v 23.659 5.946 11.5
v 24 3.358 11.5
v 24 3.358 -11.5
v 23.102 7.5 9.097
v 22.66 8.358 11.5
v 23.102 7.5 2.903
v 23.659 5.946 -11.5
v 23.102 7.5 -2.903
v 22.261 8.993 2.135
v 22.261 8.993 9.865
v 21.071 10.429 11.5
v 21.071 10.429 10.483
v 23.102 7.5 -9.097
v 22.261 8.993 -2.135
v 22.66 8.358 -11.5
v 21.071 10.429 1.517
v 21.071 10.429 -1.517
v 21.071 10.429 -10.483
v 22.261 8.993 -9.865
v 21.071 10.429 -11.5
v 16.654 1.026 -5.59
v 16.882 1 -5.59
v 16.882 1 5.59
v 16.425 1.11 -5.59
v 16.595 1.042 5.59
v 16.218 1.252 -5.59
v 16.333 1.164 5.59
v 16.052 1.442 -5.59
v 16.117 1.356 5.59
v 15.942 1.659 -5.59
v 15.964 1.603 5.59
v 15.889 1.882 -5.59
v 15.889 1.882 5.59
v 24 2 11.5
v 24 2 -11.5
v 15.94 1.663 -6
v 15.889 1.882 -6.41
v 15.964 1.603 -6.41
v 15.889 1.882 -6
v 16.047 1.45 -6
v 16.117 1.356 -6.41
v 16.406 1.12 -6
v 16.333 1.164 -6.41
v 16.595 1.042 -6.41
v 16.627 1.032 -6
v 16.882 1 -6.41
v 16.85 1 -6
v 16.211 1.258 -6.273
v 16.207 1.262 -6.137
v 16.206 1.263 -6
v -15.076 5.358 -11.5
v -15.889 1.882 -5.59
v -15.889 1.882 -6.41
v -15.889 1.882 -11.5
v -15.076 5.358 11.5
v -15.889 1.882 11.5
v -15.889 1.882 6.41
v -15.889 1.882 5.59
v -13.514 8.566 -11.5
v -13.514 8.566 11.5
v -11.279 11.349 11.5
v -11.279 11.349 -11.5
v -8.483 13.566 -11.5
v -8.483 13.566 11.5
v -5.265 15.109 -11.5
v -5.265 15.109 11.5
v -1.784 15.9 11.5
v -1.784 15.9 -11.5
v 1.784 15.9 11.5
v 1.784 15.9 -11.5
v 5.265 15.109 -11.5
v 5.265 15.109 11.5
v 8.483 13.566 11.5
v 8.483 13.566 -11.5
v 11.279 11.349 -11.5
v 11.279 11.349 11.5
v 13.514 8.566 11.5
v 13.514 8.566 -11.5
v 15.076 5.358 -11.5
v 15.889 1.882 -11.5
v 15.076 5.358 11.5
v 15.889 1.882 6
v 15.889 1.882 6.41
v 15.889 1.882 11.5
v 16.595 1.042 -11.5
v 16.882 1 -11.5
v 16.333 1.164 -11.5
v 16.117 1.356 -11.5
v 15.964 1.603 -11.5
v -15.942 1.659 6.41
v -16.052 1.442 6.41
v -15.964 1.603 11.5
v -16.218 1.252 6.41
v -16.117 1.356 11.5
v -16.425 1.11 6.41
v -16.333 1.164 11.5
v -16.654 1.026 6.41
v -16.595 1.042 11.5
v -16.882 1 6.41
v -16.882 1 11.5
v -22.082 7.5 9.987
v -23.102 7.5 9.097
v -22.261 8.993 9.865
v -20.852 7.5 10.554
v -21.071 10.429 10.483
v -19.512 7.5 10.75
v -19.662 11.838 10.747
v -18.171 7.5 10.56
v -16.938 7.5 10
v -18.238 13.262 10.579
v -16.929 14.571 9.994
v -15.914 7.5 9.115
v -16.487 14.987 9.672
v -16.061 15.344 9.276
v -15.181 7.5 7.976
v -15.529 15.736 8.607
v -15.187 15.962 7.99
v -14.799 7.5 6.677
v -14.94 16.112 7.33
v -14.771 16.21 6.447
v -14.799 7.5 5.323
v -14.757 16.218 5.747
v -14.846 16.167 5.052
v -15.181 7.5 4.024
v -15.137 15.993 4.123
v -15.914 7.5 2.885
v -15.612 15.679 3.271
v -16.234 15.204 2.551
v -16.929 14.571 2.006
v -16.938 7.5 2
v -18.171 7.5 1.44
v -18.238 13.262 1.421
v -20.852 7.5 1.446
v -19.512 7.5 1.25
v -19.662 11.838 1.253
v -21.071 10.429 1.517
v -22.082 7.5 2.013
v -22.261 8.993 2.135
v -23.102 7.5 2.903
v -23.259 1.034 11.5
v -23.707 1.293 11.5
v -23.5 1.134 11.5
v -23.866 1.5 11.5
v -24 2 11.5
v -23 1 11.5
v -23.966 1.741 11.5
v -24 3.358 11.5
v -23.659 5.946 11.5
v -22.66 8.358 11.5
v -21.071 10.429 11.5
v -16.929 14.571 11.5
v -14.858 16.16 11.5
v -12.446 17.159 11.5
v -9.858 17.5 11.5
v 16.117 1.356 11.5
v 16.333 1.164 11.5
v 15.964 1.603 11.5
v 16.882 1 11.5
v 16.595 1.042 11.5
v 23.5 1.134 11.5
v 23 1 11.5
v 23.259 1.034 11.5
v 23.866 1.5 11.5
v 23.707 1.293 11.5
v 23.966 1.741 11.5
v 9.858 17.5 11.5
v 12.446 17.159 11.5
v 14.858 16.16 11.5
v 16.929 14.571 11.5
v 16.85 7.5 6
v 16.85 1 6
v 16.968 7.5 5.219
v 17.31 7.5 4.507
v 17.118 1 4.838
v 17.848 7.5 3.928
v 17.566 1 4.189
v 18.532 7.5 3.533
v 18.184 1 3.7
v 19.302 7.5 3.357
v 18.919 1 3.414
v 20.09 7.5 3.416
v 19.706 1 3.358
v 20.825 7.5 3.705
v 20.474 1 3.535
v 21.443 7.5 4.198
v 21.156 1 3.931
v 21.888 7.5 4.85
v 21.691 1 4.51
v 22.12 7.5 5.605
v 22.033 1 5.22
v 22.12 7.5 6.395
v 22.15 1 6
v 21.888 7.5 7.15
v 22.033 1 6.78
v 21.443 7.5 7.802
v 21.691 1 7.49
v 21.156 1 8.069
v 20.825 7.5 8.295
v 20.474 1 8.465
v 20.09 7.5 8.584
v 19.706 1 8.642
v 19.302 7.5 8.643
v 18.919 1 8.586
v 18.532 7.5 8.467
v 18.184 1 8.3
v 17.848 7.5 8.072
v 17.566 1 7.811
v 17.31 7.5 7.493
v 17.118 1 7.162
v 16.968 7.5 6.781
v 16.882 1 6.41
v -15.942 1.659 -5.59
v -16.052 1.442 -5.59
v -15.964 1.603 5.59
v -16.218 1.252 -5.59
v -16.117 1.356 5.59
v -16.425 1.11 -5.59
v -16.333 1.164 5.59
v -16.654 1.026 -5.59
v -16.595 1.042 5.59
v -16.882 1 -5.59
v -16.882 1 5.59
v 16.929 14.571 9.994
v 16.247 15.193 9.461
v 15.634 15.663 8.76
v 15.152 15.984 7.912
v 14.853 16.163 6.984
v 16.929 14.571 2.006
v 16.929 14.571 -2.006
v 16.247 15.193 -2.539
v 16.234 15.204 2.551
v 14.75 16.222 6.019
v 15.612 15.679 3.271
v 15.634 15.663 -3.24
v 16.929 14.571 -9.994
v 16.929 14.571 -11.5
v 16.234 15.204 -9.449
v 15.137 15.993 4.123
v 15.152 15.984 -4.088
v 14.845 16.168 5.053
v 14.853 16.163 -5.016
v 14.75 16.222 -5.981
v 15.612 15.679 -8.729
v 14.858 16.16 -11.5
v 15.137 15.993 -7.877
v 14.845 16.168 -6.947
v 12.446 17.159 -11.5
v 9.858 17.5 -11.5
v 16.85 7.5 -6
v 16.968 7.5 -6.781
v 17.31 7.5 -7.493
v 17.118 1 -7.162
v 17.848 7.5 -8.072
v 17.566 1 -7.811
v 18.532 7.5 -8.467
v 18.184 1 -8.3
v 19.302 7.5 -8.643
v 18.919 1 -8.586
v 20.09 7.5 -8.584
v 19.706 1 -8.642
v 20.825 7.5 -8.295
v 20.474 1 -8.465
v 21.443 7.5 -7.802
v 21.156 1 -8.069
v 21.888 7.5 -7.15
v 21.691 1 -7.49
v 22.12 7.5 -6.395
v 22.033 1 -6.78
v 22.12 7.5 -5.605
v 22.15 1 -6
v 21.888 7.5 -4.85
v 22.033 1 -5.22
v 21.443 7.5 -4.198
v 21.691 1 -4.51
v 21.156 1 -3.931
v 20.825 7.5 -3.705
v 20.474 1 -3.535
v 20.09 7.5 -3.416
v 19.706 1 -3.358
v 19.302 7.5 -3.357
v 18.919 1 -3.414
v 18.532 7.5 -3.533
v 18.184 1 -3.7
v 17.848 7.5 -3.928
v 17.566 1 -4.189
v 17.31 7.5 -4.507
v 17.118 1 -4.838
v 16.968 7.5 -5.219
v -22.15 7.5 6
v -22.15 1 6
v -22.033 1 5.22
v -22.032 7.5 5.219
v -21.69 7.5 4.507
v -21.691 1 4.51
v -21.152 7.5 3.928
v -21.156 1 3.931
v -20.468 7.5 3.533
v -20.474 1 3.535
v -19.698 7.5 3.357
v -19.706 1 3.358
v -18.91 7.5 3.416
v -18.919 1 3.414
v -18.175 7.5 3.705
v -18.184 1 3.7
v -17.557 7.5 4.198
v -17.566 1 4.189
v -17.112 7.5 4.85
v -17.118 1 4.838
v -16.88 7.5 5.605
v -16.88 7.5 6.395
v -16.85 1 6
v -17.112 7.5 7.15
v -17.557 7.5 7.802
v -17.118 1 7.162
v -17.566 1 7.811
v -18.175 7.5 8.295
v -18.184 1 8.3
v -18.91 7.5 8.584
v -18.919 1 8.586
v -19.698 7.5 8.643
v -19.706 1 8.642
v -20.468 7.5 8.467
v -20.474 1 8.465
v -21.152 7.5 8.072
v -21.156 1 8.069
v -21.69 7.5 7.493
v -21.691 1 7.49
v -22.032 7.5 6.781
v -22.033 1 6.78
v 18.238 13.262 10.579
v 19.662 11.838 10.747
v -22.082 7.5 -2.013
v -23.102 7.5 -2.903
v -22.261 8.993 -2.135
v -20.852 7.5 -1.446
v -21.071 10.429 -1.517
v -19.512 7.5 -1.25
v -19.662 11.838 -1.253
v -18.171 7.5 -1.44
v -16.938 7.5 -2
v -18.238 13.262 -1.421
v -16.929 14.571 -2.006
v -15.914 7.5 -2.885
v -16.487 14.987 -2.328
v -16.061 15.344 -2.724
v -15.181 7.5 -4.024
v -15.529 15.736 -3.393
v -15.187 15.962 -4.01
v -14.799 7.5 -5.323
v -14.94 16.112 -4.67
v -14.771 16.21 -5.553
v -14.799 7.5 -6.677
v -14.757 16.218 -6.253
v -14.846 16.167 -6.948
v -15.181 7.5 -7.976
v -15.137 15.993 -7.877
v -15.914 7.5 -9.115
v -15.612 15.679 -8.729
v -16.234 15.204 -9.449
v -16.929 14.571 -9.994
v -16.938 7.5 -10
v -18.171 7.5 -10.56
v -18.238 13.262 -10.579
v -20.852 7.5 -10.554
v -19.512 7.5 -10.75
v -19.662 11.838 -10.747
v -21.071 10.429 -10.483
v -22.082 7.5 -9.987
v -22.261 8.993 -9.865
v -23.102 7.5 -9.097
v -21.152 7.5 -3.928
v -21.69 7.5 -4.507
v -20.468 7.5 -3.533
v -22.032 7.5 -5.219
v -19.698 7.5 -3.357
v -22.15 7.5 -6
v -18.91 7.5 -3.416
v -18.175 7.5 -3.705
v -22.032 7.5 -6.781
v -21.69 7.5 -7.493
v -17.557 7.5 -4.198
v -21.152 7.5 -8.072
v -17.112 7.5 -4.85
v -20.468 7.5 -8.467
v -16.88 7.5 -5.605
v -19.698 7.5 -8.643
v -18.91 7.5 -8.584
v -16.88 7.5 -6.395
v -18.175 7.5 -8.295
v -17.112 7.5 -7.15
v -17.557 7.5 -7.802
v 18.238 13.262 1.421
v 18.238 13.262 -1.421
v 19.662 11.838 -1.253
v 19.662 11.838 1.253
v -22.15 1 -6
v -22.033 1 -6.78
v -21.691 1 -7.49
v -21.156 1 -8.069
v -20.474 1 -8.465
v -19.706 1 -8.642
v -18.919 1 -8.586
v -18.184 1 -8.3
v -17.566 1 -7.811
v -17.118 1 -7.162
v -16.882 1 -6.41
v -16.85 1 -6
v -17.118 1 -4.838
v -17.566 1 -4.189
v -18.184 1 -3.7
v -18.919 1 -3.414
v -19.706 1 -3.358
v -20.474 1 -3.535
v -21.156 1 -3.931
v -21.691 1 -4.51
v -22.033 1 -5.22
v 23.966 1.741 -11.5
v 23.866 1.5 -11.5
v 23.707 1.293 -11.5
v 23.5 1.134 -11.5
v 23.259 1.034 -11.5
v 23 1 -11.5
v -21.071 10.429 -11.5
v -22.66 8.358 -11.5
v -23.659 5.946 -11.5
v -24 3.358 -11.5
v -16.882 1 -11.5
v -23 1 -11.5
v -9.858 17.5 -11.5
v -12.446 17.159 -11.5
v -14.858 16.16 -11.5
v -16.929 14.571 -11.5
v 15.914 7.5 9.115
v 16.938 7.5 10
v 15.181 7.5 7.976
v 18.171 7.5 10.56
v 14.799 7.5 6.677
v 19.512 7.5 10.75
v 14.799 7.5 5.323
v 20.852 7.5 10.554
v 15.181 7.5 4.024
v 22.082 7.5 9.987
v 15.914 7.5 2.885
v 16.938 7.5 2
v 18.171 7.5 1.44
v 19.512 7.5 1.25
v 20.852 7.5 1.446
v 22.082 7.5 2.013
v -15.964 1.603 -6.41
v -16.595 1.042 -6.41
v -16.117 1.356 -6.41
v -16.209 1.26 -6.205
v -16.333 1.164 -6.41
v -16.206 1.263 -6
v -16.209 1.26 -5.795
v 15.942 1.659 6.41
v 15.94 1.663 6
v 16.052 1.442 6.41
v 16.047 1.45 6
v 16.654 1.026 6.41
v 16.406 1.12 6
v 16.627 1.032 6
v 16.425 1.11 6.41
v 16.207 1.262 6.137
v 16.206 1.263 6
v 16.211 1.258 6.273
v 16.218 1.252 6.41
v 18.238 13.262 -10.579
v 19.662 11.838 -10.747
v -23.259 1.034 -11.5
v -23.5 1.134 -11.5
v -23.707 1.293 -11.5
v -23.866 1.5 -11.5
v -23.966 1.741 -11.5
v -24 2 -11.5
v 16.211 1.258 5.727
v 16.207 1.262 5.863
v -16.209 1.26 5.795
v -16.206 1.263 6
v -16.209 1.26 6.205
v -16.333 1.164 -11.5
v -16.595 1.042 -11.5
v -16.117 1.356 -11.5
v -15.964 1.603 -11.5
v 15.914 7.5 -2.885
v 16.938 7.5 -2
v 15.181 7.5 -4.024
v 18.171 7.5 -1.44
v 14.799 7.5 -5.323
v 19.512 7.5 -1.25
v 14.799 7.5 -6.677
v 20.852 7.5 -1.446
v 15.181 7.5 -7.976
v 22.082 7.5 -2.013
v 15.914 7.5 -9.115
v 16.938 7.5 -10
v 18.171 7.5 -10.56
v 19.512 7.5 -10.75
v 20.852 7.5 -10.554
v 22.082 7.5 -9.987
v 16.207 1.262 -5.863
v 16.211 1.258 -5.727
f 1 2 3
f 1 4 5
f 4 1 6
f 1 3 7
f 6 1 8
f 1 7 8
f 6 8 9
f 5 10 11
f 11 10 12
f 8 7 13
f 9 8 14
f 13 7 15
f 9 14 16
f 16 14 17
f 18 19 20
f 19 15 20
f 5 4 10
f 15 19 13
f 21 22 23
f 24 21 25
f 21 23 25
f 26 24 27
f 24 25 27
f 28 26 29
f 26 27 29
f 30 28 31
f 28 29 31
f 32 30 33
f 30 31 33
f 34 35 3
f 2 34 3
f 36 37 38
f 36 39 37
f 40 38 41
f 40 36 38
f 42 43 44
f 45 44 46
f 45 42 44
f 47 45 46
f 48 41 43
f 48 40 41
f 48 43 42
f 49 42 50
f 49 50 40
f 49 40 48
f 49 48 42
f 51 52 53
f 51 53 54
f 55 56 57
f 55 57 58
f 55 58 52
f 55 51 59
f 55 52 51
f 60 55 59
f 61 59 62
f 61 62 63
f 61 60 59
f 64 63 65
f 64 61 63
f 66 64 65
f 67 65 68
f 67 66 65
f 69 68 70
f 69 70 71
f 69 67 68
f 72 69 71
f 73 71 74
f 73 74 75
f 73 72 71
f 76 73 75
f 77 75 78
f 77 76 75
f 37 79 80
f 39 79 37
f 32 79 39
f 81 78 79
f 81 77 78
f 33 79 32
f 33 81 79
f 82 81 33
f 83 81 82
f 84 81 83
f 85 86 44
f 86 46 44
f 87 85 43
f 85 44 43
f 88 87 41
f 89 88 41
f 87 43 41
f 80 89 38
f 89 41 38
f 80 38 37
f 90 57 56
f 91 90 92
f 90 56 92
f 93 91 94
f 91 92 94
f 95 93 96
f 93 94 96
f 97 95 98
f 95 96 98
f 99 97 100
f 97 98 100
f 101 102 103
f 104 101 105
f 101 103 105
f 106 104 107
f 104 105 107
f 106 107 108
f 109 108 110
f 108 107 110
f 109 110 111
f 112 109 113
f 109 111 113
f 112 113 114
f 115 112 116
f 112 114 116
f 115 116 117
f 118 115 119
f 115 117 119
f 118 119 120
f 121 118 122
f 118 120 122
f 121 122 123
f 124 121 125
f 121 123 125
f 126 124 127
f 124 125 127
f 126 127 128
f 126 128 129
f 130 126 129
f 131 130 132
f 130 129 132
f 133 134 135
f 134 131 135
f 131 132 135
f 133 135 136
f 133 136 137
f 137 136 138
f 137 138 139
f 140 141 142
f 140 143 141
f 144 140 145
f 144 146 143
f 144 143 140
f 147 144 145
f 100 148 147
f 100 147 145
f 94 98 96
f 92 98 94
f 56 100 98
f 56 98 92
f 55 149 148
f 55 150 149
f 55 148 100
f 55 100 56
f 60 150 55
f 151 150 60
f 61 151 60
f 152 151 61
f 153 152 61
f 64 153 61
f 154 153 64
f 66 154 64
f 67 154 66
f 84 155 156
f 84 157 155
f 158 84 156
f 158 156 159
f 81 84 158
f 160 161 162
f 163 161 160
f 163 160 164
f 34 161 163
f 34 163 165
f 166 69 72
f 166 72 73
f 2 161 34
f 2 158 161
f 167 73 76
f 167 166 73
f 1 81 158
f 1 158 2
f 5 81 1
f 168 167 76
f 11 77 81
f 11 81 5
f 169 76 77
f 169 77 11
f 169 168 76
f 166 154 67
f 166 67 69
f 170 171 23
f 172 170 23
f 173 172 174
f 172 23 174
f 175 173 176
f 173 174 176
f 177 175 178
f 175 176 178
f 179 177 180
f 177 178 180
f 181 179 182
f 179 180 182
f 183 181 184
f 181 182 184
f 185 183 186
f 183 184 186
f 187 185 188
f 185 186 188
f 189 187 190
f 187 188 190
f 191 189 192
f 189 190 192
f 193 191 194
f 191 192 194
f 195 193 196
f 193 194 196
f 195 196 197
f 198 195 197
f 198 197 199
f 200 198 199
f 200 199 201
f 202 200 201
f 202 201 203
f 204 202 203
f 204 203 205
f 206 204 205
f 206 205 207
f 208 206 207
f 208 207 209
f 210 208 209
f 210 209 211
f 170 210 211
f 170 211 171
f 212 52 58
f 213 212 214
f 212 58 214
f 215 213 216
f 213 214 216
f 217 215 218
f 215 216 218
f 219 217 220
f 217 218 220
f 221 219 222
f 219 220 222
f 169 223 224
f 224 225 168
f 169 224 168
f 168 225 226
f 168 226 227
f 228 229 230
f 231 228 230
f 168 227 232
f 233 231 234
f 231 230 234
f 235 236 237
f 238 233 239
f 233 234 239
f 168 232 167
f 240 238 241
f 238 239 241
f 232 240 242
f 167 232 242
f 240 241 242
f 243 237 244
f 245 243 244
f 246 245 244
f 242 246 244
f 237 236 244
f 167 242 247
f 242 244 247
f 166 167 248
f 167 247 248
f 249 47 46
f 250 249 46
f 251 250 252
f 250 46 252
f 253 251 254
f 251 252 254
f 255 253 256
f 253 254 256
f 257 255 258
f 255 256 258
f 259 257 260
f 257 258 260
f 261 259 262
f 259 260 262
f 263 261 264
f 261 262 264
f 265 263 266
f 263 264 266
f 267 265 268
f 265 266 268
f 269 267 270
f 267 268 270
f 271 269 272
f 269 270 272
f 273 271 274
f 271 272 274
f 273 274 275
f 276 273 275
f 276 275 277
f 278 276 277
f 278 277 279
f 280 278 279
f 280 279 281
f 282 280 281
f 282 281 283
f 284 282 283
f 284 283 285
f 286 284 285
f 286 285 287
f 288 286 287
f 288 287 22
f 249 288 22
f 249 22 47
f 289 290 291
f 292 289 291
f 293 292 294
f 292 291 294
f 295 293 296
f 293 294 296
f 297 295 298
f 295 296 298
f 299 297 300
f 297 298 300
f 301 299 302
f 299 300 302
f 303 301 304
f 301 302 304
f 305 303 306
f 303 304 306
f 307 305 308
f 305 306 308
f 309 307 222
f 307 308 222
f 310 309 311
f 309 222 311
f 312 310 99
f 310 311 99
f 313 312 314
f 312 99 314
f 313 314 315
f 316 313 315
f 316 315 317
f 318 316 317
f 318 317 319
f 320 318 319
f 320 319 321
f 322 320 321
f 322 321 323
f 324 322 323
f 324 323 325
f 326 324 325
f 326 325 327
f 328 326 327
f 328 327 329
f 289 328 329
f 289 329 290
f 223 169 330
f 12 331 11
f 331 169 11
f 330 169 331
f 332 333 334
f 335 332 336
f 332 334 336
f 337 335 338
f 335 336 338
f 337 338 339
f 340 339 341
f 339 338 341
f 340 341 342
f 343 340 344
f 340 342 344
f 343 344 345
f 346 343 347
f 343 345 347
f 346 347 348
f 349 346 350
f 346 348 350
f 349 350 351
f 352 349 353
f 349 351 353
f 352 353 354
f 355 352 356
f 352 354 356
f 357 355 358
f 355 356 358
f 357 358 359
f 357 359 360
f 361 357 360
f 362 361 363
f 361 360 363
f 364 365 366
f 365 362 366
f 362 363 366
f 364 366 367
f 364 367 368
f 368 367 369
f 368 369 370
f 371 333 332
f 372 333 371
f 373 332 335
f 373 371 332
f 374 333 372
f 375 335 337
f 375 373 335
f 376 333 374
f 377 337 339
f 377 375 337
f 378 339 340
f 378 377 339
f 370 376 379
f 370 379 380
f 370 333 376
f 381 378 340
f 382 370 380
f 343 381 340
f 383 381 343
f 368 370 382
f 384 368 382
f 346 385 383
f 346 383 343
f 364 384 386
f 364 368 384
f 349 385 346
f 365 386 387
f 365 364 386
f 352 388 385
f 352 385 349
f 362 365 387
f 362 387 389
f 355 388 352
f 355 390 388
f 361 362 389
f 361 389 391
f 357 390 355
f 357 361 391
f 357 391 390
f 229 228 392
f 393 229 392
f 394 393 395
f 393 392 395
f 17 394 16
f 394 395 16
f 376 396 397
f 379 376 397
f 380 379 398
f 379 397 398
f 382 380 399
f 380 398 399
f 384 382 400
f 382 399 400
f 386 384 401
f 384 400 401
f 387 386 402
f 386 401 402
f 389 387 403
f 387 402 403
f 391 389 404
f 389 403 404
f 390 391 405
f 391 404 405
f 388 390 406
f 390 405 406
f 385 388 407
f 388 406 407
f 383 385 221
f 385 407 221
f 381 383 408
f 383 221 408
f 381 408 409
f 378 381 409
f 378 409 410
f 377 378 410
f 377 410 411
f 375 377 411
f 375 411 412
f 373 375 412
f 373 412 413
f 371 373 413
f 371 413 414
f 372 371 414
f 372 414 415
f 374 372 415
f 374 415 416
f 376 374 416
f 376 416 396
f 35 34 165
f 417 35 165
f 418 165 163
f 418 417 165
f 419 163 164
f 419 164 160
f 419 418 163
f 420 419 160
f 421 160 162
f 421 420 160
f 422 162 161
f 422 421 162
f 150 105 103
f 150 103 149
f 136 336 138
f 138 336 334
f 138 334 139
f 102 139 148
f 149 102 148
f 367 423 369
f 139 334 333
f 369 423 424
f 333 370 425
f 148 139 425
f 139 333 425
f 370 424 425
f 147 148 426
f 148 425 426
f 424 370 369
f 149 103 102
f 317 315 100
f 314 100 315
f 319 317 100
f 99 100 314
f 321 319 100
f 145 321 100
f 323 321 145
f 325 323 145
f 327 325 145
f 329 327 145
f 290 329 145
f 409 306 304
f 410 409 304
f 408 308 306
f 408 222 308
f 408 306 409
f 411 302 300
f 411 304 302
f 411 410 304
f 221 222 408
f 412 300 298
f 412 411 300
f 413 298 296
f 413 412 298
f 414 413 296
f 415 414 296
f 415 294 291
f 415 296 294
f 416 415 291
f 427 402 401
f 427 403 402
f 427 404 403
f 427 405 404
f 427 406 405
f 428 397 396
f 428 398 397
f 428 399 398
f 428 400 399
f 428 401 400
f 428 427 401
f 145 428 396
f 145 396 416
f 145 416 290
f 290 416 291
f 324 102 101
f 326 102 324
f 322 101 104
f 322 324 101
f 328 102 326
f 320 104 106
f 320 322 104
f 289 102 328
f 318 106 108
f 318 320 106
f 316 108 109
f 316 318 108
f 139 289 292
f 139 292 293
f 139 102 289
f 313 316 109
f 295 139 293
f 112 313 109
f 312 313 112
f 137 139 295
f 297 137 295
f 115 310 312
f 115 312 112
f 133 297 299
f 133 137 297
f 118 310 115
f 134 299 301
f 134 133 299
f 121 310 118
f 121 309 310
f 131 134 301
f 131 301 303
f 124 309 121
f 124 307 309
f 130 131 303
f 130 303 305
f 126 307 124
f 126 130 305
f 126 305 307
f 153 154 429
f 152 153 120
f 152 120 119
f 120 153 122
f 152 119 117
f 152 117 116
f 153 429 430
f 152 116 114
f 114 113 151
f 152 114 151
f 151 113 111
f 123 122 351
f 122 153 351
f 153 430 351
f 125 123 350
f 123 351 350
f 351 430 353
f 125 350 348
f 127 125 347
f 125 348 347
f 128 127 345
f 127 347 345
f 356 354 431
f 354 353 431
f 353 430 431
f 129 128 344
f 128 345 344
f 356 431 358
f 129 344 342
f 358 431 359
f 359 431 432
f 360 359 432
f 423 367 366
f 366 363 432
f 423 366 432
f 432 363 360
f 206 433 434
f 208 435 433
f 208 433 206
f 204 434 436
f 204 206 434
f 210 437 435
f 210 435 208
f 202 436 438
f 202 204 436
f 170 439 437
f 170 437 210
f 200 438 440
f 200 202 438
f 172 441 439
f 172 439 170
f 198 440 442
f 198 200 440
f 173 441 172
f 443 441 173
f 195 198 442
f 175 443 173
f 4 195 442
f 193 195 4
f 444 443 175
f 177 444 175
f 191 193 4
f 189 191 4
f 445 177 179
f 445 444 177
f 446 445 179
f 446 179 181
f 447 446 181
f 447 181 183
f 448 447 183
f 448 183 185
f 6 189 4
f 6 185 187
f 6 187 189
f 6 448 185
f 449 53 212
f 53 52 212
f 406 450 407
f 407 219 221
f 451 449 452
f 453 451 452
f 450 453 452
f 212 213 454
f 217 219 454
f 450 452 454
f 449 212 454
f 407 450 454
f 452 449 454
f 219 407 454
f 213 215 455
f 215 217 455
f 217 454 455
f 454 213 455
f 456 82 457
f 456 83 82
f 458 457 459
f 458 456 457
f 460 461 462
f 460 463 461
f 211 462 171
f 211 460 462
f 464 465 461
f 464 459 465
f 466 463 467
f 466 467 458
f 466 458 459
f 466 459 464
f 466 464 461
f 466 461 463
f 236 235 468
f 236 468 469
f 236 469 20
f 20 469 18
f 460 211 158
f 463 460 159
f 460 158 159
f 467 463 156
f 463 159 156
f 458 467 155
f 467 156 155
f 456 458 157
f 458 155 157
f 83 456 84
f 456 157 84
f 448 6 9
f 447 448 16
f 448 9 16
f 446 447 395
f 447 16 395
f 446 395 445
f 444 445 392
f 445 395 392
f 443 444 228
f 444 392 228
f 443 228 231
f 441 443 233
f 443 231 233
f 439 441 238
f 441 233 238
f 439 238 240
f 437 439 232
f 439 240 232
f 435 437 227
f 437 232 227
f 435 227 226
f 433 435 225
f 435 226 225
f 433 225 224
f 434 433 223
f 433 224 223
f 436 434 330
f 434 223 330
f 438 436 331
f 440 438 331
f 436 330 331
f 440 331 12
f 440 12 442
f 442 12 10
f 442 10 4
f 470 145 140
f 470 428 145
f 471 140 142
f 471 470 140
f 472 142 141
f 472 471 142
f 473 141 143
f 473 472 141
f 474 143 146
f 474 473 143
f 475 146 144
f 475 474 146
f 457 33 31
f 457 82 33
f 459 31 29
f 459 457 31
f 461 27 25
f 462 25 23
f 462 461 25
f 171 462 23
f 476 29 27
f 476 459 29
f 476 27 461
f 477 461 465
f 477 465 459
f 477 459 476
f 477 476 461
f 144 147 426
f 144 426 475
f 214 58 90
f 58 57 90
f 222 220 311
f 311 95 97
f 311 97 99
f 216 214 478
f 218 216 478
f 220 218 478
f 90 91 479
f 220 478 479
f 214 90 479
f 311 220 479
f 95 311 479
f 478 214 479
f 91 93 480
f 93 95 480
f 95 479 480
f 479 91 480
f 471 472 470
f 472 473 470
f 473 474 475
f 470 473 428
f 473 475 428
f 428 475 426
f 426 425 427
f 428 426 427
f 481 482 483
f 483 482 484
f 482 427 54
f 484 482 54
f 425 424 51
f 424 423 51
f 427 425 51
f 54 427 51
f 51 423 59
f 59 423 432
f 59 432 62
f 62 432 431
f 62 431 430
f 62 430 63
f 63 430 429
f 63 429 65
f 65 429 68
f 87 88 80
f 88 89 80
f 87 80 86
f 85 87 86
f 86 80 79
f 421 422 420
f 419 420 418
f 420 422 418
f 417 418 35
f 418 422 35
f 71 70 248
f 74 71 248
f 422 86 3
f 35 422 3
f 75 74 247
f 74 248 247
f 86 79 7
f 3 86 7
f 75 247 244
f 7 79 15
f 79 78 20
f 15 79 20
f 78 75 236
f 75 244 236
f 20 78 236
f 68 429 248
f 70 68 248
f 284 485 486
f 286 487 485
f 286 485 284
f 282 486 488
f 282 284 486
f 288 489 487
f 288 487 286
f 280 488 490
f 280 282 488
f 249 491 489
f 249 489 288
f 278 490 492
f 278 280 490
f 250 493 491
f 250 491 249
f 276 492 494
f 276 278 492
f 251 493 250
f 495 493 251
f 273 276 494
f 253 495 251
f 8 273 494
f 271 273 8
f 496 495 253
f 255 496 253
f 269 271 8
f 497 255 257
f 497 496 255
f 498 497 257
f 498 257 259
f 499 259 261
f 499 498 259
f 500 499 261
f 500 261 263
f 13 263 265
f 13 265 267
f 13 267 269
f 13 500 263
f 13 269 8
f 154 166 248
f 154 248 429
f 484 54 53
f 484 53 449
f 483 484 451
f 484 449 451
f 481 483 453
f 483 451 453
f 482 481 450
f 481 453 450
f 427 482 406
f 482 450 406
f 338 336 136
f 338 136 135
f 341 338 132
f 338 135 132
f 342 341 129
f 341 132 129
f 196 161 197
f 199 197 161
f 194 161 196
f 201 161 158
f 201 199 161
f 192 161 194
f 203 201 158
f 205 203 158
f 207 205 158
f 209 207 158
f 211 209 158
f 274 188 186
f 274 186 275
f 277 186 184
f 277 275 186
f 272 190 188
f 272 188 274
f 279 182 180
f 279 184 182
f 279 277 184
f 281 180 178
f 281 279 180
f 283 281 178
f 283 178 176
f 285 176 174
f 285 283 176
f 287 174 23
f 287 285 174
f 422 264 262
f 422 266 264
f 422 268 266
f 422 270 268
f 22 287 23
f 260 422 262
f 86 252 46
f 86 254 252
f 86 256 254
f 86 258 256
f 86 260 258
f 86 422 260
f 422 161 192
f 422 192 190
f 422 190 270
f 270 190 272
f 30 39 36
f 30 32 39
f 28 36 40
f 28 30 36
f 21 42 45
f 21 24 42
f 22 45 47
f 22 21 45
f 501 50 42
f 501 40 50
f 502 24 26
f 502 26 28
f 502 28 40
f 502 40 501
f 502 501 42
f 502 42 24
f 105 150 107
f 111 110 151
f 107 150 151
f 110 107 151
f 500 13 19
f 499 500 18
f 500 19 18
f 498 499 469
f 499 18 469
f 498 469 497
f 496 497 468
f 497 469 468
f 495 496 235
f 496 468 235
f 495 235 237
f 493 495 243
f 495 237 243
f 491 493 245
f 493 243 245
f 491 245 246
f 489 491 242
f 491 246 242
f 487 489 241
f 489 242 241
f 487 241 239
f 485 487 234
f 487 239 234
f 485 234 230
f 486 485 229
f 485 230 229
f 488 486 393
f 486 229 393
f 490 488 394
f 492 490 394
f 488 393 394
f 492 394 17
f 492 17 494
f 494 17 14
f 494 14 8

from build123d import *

# Parameters (mm, degrees)
BOSS_EXTRUDE1_DEPTH            = 11.5
CBORE_FOR_M5_SHCS1_D           = 5.3
CBORE_FOR_M5_SHCS1_CBORE_D     = 9.5
CBORE_FOR_M5_SHCS1_CBORE_DEPTH = 10
CHAMFER_2_REACH                = 39.567
SKETCH5_W                      = 48
SKETCH5_H                      = 23
CUT_EXTRUDE2_DEPTH             = 1
CUT_EXTRUDE3_DEPTH             = 38.566607513
CUT_EXTRUDE3_DEPTH_BACK        = 38.566607513
FILLET1_R                      = 1


with BuildPart() as part:
    # Sketch1 → Boss-Extrude1 (new, symmetric)
    with BuildSketch(Plane.XY):
        with BuildLine():
            Line((24, 17.5), (-24, 17.5))
            Line((-24, 17.5), (-24, 0))
            Line((-24, 0), (-16, 0))
            ThreePointArc((-16, 0), (0, 16), (16, 0))
            Line((16, 0), (24, 0))
            Line((24, 0), (24, 17.5))
        make_face()
    extrude(amount=BOSS_EXTRUDE1_DEPTH, both=True)

    # CBORE for M5 SHCS1 (through all)
    with Locations(Plane(origin=(0, 17.5, 0), x_dir=(1, 0, 0), z_dir=(0, 1, 0))):
        with Locations((-19.5, -6), (-19.5, 6), (19.5, -6), (19.5, 6)):
            CounterBoreHole(CBORE_FOR_M5_SHCS1_D / 2, CBORE_FOR_M5_SHCS1_CBORE_D / 2, CBORE_FOR_M5_SHCS1_CBORE_DEPTH)

    # Sketch4 → Chamfer 2 (cut, up to next)
    with BuildSketch(Plane.XY.offset(11.5), mode=Mode.PRIVATE) as chamfer_2_sk1:
        Polygon((24, 17.5), (14, 17.5), (24, 7.5), align=None)
    chamfer_2_tool1 = extrude(chamfer_2_sk1.sketch, amount=-CHAMFER_2_REACH, mode=Mode.PRIVATE) & part.part
    # Sketch4 → Chamfer 2 (cut, up to next)
    with BuildSketch(Plane.XY.offset(11.5), mode=Mode.PRIVATE) as chamfer_2_sk2:
        Polygon((-14, 17.5), (-24, 17.5), (-24, 7.5), align=None)
    chamfer_2_tool2 = extrude(chamfer_2_sk2.sketch, amount=-CHAMFER_2_REACH, mode=Mode.PRIVATE) & part.part
    add(chamfer_2_tool1.solids().sort_by_distance((20.666667, 14.166667, 11.5))[0], mode=Mode.SUBTRACT)
    add(chamfer_2_tool2.solids().sort_by_distance((-20.666667, 14.166667, 11.5))[0], mode=Mode.SUBTRACT)

    # Sketch5 → Cut-Extrude2 (cut)
    with BuildSketch(Plane(origin=(0, 0, 0), x_dir=(-1, 0, 0), z_dir=(0, -1, 0))):
        Rectangle(SKETCH5_W, SKETCH5_H)
    extrude(amount=-CUT_EXTRUDE2_DEPTH, mode=Mode.SUBTRACT)

    # Sketch6 → Cut-Extrude3 (cut, two sides: drawn at the far end of the back side and taken through both)
    with BuildSketch(Plane.XY.offset(11.5).offset(-CUT_EXTRUDE3_DEPTH_BACK)):
        with BuildLine():
            Line((-24, 3.357864376), (-24, 7.5))
            Line((-24, 7.5), (-21.071067812, 10.428932188))
            ThreePointArc((-21.071067812, 10.428932188), (-23.238795325, 7.1846987), (-24, 3.357864376))
        make_face()
        with BuildLine():
            Line((-16.928932188, 14.571067812), (-14, 17.5))
            Line((-14, 17.5), (-9.857864376, 17.5))
            ThreePointArc((-9.857864376, 17.5), (-13.6846987, 16.738795325), (-16.928932188, 14.571067812))
        make_face()
        with BuildLine():
            Line((9.857864376, 17.5), (14, 17.5))
            Line((14, 17.5), (16.928932188, 14.571067812))
            ThreePointArc((16.928932188, 14.571067812), (13.6846987, 16.738795325), (9.857864376, 17.5))
        make_face()
        with BuildLine():
            Line((21.071067812, 10.428932188), (24, 7.5))
            Line((24, 7.5), (24, 3.357864376))
            ThreePointArc((24, 3.357864376), (23.238795325, 7.1846987), (21.071067812, 10.428932188))
        make_face()
    extrude(amount=CUT_EXTRUDE3_DEPTH + CUT_EXTRUDE3_DEPTH_BACK, mode=Mode.SUBTRACT)

    # Fillet1
    fillet1_edges = [part.edges().sort_by_distance(p)[0] for p in [
        (-15.968719423, 1, 0),
        (15.968719423, 1, 0),
        (-24, 1, 0),
        (24, 1, 0),
    ]]
    fillet(fillet1_edges, radius=FILLET1_R)


solid = part.part
